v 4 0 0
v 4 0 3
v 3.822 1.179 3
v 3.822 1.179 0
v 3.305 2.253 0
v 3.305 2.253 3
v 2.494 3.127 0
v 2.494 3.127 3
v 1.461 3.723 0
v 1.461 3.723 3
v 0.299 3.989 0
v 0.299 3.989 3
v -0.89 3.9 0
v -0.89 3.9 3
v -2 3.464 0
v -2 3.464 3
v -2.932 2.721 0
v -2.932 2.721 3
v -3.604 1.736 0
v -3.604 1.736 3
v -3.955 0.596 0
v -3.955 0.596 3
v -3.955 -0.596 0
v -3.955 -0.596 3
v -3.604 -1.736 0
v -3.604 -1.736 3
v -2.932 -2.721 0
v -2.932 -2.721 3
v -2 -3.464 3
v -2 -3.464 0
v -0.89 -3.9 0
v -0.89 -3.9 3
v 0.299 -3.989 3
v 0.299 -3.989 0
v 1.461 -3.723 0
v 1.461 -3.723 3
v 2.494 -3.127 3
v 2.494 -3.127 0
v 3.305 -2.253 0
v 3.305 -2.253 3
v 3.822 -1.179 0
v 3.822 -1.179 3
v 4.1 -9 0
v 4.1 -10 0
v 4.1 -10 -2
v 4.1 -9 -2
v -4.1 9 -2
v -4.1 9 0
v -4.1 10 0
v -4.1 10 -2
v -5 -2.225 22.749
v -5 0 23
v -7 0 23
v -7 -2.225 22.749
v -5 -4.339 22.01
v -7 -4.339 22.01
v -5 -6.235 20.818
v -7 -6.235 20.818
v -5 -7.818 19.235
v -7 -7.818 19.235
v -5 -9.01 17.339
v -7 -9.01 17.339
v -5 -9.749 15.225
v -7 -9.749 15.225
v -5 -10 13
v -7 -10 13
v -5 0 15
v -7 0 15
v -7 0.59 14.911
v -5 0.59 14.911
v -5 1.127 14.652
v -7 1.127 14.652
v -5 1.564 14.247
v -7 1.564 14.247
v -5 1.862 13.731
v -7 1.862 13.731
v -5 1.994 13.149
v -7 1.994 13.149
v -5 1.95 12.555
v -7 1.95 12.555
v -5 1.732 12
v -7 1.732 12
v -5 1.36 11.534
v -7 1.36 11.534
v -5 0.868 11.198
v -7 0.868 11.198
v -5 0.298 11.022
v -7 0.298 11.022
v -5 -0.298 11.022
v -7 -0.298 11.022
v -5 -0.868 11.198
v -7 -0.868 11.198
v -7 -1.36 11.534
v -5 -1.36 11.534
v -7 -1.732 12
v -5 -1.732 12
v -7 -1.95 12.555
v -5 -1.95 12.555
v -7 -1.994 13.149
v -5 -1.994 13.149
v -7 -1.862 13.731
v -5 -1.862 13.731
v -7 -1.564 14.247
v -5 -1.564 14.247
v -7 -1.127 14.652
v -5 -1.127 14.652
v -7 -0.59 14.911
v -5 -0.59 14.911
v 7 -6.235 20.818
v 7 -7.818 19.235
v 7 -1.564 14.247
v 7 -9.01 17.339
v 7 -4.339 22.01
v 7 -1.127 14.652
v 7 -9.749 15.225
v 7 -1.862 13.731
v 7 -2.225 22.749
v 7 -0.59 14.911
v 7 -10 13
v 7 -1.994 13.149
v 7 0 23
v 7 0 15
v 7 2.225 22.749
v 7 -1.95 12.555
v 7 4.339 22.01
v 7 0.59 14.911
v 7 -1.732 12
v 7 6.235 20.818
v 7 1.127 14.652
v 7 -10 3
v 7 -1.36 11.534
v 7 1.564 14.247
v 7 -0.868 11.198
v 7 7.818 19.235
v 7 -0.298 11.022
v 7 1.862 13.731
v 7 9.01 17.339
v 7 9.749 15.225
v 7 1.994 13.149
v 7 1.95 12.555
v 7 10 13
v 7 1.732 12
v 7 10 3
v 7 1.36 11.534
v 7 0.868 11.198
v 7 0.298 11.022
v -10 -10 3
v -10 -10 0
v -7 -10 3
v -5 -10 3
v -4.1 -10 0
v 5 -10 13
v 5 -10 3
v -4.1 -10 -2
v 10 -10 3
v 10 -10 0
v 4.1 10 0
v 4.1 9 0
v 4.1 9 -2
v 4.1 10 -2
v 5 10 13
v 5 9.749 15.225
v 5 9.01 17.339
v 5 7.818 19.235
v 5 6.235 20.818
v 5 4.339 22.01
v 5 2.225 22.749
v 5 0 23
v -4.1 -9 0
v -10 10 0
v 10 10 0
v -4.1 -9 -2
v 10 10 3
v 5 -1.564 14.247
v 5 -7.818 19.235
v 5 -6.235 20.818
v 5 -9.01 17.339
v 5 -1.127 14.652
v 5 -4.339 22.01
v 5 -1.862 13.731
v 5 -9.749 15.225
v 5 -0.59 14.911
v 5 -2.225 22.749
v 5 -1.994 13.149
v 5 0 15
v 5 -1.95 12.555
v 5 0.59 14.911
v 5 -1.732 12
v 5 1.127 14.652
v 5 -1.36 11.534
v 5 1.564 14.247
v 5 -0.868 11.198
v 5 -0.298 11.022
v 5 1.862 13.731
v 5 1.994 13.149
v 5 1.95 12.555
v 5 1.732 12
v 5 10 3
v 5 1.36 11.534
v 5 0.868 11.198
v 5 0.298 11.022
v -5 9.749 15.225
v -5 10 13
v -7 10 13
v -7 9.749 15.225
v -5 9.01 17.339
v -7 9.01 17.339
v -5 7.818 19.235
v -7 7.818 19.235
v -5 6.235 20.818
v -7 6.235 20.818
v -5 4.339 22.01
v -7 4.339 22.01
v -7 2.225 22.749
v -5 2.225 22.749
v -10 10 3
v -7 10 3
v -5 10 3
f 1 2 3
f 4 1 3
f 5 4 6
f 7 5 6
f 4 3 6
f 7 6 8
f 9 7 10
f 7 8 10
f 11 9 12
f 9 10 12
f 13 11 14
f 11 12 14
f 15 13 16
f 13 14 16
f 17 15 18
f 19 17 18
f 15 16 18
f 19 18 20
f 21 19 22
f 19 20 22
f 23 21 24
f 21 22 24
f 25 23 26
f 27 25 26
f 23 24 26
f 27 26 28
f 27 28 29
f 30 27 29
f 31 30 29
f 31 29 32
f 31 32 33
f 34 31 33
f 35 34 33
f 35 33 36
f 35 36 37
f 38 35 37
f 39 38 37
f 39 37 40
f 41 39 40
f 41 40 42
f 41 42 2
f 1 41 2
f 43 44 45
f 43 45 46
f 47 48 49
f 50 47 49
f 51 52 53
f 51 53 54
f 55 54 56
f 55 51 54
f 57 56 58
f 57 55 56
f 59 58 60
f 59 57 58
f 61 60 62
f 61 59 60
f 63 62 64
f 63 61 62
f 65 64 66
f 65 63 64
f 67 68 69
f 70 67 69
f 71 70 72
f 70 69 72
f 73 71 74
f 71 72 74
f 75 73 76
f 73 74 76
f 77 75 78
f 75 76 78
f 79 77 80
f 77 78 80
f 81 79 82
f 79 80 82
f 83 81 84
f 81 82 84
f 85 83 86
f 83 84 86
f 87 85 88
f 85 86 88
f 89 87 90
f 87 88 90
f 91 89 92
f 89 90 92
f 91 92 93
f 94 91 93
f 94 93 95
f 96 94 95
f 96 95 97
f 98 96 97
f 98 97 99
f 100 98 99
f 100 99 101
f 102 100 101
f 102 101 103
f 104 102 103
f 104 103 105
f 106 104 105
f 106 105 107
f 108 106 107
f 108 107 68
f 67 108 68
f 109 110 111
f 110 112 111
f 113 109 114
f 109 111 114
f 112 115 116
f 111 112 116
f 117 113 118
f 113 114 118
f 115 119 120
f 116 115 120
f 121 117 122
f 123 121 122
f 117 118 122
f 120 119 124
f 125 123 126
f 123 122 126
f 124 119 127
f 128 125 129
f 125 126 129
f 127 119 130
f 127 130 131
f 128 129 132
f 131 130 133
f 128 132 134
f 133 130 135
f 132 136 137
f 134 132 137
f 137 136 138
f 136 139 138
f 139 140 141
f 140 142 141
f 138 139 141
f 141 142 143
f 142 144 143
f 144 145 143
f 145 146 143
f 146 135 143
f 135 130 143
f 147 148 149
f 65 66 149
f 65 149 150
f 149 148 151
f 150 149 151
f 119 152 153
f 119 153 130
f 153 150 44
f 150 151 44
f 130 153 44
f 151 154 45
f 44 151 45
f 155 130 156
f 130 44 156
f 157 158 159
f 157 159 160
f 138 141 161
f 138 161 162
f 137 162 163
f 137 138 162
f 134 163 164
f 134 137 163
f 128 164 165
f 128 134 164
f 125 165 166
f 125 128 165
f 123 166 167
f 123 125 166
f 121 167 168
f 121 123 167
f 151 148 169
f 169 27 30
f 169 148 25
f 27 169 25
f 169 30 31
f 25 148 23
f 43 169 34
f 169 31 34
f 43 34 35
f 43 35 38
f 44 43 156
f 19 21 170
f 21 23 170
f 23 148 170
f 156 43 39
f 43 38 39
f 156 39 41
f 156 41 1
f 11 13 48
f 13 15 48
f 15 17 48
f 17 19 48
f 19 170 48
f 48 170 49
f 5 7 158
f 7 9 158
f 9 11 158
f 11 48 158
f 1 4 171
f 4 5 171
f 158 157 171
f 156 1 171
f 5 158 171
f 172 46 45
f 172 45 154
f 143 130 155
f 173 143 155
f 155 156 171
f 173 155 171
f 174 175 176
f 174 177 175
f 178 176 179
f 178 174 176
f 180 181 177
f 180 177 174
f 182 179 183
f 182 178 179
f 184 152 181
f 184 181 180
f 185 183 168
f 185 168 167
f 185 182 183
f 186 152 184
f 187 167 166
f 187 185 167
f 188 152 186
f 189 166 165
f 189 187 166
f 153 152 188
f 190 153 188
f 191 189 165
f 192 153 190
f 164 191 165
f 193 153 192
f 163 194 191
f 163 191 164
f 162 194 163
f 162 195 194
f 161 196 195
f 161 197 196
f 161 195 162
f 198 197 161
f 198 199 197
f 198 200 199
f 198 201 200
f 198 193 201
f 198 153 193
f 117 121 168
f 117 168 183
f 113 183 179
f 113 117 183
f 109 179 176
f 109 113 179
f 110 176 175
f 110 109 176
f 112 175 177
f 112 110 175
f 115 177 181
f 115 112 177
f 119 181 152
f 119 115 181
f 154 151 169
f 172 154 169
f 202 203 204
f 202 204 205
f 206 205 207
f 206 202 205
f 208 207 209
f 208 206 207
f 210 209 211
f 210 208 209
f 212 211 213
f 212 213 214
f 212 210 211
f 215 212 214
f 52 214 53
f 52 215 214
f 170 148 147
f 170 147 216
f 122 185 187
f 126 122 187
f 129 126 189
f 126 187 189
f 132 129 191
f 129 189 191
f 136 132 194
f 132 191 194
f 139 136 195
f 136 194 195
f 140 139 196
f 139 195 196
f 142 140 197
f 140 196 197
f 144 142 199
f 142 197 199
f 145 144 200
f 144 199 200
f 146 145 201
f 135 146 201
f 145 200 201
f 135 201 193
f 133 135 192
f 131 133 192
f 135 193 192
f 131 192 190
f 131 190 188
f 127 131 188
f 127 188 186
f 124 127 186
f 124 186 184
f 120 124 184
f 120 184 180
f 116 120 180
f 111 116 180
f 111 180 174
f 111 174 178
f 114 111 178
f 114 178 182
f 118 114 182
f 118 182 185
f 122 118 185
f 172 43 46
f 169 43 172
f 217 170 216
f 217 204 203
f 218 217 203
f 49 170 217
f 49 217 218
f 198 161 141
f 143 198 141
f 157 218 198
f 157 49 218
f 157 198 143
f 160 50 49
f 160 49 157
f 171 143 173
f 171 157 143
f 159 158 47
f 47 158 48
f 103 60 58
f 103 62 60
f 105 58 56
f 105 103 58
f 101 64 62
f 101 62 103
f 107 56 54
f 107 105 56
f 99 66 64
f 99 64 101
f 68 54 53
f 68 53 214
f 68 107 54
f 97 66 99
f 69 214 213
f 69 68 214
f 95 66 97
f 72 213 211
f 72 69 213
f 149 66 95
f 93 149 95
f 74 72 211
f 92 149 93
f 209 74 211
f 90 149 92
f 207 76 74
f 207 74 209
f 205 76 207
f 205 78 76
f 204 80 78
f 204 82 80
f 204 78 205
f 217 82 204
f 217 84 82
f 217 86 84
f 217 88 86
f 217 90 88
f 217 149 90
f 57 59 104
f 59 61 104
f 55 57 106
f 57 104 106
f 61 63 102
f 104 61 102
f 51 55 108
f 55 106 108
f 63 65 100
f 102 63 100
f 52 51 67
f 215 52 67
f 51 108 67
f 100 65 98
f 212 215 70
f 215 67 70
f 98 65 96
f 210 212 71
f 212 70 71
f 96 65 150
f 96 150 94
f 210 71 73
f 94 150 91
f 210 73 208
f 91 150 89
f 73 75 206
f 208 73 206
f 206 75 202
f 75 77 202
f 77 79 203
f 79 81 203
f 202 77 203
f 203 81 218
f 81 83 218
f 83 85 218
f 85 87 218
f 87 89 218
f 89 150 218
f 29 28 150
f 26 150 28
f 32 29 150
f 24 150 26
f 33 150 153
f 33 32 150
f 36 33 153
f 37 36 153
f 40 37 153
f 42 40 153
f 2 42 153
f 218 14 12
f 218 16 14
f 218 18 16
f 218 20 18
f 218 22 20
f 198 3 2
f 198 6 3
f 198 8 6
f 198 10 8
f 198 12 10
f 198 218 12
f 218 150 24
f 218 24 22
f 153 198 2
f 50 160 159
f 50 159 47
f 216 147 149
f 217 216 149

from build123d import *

# Parameters (mm, degrees)
SKETCH_1_W          = 20
SKETCH_1_H          = 20
EXTRUDE_1_DEPTH     = 3
SKETCH_2_W          = 2
SKETCH_2_H          = 20
EXTRUDE_2_DEPTH     = 20
CUT_EXTRUDE_START   = -14
CUT_EXTRUDE_2_DEPTH = 14
SKETCH_4_R          = 2
CUT_EXTRUDE_3_DEPTH = 31.298514815
SKETCH_6_R          = 4
CUT_EXTRUDE_5_DEPTH = 25.494897428
SKETCH_7_W          = 8.2
SKETCH_7_H          = 1
EXTRUDE_3_DEPTH     = 2


# Read off the part's stored shape, not the designer's step: 切除-拉伸2
with BuildPart() as part:
    # 草图1 → 凸台-拉伸1 (new body)
    with BuildSketch(Plane.XY):
        Rectangle(SKETCH_1_W, SKETCH_1_H)
    extrude(amount=EXTRUDE_1_DEPTH)

    # 草图2 → 凸台-拉伸2 (add)
    with BuildSketch(Plane.XY.offset(3)):
        with Locations((-6, 0)):
            Rectangle(SKETCH_2_W, SKETCH_2_H)
        with Locations((6, 0)):
            Rectangle(SKETCH_2_W, SKETCH_2_H)
    extrude(amount=EXTRUDE_2_DEPTH)

    # 切除-拉伸2 outline → 切除-拉伸2 (cut)
    with BuildSketch(Plane.ZY.offset(7).offset(CUT_EXTRUDE_START)):
        with BuildLine():
            Line((23, 10), (13, 10))
            ThreePointArc((13, 10), (20.071067812, 7.071067812), (23, 0))
            Line((23, 0), (23, 10))
        make_face()
        with BuildLine():
            Line((23, -10), (23, 0))
            ThreePointArc((23, 0), (20.071067812, -7.071067812), (13, -10))
            Line((13, -10), (23, -10))
        make_face()
    extrude(amount=CUT_EXTRUDE_2_DEPTH, mode=Mode.SUBTRACT)

    # 草图4 → 切除-拉伸3 (cut, through all)
    with BuildSketch(Plane.ZY.offset(7)):
        with Locations((13, 0)):
            Circle(SKETCH_4_R)
    extrude(amount=-CUT_EXTRUDE_3_DEPTH, mode=Mode.SUBTRACT)

    # 草图6 → 切除-拉伸5 (cut, through all)
    with BuildSketch(Plane.XY.offset(3)):
        Circle(SKETCH_6_R)
    extrude(amount=-CUT_EXTRUDE_5_DEPTH, mode=Mode.SUBTRACT)

    # 草图7 → 凸台-拉伸3 (add)
    with BuildSketch(Plane(origin=(0, 0, 0), x_dir=(-1, 0, 0), z_dir=(0, 0, -1))):
        with Locations((0, 9.5)):
            Rectangle(SKETCH_7_W, SKETCH_7_H)
        with Locations((0, -9.5)):
            Rectangle(SKETCH_7_W, SKETCH_7_H)
    extrude(amount=EXTRUDE_3_DEPTH)


solid = part.part
